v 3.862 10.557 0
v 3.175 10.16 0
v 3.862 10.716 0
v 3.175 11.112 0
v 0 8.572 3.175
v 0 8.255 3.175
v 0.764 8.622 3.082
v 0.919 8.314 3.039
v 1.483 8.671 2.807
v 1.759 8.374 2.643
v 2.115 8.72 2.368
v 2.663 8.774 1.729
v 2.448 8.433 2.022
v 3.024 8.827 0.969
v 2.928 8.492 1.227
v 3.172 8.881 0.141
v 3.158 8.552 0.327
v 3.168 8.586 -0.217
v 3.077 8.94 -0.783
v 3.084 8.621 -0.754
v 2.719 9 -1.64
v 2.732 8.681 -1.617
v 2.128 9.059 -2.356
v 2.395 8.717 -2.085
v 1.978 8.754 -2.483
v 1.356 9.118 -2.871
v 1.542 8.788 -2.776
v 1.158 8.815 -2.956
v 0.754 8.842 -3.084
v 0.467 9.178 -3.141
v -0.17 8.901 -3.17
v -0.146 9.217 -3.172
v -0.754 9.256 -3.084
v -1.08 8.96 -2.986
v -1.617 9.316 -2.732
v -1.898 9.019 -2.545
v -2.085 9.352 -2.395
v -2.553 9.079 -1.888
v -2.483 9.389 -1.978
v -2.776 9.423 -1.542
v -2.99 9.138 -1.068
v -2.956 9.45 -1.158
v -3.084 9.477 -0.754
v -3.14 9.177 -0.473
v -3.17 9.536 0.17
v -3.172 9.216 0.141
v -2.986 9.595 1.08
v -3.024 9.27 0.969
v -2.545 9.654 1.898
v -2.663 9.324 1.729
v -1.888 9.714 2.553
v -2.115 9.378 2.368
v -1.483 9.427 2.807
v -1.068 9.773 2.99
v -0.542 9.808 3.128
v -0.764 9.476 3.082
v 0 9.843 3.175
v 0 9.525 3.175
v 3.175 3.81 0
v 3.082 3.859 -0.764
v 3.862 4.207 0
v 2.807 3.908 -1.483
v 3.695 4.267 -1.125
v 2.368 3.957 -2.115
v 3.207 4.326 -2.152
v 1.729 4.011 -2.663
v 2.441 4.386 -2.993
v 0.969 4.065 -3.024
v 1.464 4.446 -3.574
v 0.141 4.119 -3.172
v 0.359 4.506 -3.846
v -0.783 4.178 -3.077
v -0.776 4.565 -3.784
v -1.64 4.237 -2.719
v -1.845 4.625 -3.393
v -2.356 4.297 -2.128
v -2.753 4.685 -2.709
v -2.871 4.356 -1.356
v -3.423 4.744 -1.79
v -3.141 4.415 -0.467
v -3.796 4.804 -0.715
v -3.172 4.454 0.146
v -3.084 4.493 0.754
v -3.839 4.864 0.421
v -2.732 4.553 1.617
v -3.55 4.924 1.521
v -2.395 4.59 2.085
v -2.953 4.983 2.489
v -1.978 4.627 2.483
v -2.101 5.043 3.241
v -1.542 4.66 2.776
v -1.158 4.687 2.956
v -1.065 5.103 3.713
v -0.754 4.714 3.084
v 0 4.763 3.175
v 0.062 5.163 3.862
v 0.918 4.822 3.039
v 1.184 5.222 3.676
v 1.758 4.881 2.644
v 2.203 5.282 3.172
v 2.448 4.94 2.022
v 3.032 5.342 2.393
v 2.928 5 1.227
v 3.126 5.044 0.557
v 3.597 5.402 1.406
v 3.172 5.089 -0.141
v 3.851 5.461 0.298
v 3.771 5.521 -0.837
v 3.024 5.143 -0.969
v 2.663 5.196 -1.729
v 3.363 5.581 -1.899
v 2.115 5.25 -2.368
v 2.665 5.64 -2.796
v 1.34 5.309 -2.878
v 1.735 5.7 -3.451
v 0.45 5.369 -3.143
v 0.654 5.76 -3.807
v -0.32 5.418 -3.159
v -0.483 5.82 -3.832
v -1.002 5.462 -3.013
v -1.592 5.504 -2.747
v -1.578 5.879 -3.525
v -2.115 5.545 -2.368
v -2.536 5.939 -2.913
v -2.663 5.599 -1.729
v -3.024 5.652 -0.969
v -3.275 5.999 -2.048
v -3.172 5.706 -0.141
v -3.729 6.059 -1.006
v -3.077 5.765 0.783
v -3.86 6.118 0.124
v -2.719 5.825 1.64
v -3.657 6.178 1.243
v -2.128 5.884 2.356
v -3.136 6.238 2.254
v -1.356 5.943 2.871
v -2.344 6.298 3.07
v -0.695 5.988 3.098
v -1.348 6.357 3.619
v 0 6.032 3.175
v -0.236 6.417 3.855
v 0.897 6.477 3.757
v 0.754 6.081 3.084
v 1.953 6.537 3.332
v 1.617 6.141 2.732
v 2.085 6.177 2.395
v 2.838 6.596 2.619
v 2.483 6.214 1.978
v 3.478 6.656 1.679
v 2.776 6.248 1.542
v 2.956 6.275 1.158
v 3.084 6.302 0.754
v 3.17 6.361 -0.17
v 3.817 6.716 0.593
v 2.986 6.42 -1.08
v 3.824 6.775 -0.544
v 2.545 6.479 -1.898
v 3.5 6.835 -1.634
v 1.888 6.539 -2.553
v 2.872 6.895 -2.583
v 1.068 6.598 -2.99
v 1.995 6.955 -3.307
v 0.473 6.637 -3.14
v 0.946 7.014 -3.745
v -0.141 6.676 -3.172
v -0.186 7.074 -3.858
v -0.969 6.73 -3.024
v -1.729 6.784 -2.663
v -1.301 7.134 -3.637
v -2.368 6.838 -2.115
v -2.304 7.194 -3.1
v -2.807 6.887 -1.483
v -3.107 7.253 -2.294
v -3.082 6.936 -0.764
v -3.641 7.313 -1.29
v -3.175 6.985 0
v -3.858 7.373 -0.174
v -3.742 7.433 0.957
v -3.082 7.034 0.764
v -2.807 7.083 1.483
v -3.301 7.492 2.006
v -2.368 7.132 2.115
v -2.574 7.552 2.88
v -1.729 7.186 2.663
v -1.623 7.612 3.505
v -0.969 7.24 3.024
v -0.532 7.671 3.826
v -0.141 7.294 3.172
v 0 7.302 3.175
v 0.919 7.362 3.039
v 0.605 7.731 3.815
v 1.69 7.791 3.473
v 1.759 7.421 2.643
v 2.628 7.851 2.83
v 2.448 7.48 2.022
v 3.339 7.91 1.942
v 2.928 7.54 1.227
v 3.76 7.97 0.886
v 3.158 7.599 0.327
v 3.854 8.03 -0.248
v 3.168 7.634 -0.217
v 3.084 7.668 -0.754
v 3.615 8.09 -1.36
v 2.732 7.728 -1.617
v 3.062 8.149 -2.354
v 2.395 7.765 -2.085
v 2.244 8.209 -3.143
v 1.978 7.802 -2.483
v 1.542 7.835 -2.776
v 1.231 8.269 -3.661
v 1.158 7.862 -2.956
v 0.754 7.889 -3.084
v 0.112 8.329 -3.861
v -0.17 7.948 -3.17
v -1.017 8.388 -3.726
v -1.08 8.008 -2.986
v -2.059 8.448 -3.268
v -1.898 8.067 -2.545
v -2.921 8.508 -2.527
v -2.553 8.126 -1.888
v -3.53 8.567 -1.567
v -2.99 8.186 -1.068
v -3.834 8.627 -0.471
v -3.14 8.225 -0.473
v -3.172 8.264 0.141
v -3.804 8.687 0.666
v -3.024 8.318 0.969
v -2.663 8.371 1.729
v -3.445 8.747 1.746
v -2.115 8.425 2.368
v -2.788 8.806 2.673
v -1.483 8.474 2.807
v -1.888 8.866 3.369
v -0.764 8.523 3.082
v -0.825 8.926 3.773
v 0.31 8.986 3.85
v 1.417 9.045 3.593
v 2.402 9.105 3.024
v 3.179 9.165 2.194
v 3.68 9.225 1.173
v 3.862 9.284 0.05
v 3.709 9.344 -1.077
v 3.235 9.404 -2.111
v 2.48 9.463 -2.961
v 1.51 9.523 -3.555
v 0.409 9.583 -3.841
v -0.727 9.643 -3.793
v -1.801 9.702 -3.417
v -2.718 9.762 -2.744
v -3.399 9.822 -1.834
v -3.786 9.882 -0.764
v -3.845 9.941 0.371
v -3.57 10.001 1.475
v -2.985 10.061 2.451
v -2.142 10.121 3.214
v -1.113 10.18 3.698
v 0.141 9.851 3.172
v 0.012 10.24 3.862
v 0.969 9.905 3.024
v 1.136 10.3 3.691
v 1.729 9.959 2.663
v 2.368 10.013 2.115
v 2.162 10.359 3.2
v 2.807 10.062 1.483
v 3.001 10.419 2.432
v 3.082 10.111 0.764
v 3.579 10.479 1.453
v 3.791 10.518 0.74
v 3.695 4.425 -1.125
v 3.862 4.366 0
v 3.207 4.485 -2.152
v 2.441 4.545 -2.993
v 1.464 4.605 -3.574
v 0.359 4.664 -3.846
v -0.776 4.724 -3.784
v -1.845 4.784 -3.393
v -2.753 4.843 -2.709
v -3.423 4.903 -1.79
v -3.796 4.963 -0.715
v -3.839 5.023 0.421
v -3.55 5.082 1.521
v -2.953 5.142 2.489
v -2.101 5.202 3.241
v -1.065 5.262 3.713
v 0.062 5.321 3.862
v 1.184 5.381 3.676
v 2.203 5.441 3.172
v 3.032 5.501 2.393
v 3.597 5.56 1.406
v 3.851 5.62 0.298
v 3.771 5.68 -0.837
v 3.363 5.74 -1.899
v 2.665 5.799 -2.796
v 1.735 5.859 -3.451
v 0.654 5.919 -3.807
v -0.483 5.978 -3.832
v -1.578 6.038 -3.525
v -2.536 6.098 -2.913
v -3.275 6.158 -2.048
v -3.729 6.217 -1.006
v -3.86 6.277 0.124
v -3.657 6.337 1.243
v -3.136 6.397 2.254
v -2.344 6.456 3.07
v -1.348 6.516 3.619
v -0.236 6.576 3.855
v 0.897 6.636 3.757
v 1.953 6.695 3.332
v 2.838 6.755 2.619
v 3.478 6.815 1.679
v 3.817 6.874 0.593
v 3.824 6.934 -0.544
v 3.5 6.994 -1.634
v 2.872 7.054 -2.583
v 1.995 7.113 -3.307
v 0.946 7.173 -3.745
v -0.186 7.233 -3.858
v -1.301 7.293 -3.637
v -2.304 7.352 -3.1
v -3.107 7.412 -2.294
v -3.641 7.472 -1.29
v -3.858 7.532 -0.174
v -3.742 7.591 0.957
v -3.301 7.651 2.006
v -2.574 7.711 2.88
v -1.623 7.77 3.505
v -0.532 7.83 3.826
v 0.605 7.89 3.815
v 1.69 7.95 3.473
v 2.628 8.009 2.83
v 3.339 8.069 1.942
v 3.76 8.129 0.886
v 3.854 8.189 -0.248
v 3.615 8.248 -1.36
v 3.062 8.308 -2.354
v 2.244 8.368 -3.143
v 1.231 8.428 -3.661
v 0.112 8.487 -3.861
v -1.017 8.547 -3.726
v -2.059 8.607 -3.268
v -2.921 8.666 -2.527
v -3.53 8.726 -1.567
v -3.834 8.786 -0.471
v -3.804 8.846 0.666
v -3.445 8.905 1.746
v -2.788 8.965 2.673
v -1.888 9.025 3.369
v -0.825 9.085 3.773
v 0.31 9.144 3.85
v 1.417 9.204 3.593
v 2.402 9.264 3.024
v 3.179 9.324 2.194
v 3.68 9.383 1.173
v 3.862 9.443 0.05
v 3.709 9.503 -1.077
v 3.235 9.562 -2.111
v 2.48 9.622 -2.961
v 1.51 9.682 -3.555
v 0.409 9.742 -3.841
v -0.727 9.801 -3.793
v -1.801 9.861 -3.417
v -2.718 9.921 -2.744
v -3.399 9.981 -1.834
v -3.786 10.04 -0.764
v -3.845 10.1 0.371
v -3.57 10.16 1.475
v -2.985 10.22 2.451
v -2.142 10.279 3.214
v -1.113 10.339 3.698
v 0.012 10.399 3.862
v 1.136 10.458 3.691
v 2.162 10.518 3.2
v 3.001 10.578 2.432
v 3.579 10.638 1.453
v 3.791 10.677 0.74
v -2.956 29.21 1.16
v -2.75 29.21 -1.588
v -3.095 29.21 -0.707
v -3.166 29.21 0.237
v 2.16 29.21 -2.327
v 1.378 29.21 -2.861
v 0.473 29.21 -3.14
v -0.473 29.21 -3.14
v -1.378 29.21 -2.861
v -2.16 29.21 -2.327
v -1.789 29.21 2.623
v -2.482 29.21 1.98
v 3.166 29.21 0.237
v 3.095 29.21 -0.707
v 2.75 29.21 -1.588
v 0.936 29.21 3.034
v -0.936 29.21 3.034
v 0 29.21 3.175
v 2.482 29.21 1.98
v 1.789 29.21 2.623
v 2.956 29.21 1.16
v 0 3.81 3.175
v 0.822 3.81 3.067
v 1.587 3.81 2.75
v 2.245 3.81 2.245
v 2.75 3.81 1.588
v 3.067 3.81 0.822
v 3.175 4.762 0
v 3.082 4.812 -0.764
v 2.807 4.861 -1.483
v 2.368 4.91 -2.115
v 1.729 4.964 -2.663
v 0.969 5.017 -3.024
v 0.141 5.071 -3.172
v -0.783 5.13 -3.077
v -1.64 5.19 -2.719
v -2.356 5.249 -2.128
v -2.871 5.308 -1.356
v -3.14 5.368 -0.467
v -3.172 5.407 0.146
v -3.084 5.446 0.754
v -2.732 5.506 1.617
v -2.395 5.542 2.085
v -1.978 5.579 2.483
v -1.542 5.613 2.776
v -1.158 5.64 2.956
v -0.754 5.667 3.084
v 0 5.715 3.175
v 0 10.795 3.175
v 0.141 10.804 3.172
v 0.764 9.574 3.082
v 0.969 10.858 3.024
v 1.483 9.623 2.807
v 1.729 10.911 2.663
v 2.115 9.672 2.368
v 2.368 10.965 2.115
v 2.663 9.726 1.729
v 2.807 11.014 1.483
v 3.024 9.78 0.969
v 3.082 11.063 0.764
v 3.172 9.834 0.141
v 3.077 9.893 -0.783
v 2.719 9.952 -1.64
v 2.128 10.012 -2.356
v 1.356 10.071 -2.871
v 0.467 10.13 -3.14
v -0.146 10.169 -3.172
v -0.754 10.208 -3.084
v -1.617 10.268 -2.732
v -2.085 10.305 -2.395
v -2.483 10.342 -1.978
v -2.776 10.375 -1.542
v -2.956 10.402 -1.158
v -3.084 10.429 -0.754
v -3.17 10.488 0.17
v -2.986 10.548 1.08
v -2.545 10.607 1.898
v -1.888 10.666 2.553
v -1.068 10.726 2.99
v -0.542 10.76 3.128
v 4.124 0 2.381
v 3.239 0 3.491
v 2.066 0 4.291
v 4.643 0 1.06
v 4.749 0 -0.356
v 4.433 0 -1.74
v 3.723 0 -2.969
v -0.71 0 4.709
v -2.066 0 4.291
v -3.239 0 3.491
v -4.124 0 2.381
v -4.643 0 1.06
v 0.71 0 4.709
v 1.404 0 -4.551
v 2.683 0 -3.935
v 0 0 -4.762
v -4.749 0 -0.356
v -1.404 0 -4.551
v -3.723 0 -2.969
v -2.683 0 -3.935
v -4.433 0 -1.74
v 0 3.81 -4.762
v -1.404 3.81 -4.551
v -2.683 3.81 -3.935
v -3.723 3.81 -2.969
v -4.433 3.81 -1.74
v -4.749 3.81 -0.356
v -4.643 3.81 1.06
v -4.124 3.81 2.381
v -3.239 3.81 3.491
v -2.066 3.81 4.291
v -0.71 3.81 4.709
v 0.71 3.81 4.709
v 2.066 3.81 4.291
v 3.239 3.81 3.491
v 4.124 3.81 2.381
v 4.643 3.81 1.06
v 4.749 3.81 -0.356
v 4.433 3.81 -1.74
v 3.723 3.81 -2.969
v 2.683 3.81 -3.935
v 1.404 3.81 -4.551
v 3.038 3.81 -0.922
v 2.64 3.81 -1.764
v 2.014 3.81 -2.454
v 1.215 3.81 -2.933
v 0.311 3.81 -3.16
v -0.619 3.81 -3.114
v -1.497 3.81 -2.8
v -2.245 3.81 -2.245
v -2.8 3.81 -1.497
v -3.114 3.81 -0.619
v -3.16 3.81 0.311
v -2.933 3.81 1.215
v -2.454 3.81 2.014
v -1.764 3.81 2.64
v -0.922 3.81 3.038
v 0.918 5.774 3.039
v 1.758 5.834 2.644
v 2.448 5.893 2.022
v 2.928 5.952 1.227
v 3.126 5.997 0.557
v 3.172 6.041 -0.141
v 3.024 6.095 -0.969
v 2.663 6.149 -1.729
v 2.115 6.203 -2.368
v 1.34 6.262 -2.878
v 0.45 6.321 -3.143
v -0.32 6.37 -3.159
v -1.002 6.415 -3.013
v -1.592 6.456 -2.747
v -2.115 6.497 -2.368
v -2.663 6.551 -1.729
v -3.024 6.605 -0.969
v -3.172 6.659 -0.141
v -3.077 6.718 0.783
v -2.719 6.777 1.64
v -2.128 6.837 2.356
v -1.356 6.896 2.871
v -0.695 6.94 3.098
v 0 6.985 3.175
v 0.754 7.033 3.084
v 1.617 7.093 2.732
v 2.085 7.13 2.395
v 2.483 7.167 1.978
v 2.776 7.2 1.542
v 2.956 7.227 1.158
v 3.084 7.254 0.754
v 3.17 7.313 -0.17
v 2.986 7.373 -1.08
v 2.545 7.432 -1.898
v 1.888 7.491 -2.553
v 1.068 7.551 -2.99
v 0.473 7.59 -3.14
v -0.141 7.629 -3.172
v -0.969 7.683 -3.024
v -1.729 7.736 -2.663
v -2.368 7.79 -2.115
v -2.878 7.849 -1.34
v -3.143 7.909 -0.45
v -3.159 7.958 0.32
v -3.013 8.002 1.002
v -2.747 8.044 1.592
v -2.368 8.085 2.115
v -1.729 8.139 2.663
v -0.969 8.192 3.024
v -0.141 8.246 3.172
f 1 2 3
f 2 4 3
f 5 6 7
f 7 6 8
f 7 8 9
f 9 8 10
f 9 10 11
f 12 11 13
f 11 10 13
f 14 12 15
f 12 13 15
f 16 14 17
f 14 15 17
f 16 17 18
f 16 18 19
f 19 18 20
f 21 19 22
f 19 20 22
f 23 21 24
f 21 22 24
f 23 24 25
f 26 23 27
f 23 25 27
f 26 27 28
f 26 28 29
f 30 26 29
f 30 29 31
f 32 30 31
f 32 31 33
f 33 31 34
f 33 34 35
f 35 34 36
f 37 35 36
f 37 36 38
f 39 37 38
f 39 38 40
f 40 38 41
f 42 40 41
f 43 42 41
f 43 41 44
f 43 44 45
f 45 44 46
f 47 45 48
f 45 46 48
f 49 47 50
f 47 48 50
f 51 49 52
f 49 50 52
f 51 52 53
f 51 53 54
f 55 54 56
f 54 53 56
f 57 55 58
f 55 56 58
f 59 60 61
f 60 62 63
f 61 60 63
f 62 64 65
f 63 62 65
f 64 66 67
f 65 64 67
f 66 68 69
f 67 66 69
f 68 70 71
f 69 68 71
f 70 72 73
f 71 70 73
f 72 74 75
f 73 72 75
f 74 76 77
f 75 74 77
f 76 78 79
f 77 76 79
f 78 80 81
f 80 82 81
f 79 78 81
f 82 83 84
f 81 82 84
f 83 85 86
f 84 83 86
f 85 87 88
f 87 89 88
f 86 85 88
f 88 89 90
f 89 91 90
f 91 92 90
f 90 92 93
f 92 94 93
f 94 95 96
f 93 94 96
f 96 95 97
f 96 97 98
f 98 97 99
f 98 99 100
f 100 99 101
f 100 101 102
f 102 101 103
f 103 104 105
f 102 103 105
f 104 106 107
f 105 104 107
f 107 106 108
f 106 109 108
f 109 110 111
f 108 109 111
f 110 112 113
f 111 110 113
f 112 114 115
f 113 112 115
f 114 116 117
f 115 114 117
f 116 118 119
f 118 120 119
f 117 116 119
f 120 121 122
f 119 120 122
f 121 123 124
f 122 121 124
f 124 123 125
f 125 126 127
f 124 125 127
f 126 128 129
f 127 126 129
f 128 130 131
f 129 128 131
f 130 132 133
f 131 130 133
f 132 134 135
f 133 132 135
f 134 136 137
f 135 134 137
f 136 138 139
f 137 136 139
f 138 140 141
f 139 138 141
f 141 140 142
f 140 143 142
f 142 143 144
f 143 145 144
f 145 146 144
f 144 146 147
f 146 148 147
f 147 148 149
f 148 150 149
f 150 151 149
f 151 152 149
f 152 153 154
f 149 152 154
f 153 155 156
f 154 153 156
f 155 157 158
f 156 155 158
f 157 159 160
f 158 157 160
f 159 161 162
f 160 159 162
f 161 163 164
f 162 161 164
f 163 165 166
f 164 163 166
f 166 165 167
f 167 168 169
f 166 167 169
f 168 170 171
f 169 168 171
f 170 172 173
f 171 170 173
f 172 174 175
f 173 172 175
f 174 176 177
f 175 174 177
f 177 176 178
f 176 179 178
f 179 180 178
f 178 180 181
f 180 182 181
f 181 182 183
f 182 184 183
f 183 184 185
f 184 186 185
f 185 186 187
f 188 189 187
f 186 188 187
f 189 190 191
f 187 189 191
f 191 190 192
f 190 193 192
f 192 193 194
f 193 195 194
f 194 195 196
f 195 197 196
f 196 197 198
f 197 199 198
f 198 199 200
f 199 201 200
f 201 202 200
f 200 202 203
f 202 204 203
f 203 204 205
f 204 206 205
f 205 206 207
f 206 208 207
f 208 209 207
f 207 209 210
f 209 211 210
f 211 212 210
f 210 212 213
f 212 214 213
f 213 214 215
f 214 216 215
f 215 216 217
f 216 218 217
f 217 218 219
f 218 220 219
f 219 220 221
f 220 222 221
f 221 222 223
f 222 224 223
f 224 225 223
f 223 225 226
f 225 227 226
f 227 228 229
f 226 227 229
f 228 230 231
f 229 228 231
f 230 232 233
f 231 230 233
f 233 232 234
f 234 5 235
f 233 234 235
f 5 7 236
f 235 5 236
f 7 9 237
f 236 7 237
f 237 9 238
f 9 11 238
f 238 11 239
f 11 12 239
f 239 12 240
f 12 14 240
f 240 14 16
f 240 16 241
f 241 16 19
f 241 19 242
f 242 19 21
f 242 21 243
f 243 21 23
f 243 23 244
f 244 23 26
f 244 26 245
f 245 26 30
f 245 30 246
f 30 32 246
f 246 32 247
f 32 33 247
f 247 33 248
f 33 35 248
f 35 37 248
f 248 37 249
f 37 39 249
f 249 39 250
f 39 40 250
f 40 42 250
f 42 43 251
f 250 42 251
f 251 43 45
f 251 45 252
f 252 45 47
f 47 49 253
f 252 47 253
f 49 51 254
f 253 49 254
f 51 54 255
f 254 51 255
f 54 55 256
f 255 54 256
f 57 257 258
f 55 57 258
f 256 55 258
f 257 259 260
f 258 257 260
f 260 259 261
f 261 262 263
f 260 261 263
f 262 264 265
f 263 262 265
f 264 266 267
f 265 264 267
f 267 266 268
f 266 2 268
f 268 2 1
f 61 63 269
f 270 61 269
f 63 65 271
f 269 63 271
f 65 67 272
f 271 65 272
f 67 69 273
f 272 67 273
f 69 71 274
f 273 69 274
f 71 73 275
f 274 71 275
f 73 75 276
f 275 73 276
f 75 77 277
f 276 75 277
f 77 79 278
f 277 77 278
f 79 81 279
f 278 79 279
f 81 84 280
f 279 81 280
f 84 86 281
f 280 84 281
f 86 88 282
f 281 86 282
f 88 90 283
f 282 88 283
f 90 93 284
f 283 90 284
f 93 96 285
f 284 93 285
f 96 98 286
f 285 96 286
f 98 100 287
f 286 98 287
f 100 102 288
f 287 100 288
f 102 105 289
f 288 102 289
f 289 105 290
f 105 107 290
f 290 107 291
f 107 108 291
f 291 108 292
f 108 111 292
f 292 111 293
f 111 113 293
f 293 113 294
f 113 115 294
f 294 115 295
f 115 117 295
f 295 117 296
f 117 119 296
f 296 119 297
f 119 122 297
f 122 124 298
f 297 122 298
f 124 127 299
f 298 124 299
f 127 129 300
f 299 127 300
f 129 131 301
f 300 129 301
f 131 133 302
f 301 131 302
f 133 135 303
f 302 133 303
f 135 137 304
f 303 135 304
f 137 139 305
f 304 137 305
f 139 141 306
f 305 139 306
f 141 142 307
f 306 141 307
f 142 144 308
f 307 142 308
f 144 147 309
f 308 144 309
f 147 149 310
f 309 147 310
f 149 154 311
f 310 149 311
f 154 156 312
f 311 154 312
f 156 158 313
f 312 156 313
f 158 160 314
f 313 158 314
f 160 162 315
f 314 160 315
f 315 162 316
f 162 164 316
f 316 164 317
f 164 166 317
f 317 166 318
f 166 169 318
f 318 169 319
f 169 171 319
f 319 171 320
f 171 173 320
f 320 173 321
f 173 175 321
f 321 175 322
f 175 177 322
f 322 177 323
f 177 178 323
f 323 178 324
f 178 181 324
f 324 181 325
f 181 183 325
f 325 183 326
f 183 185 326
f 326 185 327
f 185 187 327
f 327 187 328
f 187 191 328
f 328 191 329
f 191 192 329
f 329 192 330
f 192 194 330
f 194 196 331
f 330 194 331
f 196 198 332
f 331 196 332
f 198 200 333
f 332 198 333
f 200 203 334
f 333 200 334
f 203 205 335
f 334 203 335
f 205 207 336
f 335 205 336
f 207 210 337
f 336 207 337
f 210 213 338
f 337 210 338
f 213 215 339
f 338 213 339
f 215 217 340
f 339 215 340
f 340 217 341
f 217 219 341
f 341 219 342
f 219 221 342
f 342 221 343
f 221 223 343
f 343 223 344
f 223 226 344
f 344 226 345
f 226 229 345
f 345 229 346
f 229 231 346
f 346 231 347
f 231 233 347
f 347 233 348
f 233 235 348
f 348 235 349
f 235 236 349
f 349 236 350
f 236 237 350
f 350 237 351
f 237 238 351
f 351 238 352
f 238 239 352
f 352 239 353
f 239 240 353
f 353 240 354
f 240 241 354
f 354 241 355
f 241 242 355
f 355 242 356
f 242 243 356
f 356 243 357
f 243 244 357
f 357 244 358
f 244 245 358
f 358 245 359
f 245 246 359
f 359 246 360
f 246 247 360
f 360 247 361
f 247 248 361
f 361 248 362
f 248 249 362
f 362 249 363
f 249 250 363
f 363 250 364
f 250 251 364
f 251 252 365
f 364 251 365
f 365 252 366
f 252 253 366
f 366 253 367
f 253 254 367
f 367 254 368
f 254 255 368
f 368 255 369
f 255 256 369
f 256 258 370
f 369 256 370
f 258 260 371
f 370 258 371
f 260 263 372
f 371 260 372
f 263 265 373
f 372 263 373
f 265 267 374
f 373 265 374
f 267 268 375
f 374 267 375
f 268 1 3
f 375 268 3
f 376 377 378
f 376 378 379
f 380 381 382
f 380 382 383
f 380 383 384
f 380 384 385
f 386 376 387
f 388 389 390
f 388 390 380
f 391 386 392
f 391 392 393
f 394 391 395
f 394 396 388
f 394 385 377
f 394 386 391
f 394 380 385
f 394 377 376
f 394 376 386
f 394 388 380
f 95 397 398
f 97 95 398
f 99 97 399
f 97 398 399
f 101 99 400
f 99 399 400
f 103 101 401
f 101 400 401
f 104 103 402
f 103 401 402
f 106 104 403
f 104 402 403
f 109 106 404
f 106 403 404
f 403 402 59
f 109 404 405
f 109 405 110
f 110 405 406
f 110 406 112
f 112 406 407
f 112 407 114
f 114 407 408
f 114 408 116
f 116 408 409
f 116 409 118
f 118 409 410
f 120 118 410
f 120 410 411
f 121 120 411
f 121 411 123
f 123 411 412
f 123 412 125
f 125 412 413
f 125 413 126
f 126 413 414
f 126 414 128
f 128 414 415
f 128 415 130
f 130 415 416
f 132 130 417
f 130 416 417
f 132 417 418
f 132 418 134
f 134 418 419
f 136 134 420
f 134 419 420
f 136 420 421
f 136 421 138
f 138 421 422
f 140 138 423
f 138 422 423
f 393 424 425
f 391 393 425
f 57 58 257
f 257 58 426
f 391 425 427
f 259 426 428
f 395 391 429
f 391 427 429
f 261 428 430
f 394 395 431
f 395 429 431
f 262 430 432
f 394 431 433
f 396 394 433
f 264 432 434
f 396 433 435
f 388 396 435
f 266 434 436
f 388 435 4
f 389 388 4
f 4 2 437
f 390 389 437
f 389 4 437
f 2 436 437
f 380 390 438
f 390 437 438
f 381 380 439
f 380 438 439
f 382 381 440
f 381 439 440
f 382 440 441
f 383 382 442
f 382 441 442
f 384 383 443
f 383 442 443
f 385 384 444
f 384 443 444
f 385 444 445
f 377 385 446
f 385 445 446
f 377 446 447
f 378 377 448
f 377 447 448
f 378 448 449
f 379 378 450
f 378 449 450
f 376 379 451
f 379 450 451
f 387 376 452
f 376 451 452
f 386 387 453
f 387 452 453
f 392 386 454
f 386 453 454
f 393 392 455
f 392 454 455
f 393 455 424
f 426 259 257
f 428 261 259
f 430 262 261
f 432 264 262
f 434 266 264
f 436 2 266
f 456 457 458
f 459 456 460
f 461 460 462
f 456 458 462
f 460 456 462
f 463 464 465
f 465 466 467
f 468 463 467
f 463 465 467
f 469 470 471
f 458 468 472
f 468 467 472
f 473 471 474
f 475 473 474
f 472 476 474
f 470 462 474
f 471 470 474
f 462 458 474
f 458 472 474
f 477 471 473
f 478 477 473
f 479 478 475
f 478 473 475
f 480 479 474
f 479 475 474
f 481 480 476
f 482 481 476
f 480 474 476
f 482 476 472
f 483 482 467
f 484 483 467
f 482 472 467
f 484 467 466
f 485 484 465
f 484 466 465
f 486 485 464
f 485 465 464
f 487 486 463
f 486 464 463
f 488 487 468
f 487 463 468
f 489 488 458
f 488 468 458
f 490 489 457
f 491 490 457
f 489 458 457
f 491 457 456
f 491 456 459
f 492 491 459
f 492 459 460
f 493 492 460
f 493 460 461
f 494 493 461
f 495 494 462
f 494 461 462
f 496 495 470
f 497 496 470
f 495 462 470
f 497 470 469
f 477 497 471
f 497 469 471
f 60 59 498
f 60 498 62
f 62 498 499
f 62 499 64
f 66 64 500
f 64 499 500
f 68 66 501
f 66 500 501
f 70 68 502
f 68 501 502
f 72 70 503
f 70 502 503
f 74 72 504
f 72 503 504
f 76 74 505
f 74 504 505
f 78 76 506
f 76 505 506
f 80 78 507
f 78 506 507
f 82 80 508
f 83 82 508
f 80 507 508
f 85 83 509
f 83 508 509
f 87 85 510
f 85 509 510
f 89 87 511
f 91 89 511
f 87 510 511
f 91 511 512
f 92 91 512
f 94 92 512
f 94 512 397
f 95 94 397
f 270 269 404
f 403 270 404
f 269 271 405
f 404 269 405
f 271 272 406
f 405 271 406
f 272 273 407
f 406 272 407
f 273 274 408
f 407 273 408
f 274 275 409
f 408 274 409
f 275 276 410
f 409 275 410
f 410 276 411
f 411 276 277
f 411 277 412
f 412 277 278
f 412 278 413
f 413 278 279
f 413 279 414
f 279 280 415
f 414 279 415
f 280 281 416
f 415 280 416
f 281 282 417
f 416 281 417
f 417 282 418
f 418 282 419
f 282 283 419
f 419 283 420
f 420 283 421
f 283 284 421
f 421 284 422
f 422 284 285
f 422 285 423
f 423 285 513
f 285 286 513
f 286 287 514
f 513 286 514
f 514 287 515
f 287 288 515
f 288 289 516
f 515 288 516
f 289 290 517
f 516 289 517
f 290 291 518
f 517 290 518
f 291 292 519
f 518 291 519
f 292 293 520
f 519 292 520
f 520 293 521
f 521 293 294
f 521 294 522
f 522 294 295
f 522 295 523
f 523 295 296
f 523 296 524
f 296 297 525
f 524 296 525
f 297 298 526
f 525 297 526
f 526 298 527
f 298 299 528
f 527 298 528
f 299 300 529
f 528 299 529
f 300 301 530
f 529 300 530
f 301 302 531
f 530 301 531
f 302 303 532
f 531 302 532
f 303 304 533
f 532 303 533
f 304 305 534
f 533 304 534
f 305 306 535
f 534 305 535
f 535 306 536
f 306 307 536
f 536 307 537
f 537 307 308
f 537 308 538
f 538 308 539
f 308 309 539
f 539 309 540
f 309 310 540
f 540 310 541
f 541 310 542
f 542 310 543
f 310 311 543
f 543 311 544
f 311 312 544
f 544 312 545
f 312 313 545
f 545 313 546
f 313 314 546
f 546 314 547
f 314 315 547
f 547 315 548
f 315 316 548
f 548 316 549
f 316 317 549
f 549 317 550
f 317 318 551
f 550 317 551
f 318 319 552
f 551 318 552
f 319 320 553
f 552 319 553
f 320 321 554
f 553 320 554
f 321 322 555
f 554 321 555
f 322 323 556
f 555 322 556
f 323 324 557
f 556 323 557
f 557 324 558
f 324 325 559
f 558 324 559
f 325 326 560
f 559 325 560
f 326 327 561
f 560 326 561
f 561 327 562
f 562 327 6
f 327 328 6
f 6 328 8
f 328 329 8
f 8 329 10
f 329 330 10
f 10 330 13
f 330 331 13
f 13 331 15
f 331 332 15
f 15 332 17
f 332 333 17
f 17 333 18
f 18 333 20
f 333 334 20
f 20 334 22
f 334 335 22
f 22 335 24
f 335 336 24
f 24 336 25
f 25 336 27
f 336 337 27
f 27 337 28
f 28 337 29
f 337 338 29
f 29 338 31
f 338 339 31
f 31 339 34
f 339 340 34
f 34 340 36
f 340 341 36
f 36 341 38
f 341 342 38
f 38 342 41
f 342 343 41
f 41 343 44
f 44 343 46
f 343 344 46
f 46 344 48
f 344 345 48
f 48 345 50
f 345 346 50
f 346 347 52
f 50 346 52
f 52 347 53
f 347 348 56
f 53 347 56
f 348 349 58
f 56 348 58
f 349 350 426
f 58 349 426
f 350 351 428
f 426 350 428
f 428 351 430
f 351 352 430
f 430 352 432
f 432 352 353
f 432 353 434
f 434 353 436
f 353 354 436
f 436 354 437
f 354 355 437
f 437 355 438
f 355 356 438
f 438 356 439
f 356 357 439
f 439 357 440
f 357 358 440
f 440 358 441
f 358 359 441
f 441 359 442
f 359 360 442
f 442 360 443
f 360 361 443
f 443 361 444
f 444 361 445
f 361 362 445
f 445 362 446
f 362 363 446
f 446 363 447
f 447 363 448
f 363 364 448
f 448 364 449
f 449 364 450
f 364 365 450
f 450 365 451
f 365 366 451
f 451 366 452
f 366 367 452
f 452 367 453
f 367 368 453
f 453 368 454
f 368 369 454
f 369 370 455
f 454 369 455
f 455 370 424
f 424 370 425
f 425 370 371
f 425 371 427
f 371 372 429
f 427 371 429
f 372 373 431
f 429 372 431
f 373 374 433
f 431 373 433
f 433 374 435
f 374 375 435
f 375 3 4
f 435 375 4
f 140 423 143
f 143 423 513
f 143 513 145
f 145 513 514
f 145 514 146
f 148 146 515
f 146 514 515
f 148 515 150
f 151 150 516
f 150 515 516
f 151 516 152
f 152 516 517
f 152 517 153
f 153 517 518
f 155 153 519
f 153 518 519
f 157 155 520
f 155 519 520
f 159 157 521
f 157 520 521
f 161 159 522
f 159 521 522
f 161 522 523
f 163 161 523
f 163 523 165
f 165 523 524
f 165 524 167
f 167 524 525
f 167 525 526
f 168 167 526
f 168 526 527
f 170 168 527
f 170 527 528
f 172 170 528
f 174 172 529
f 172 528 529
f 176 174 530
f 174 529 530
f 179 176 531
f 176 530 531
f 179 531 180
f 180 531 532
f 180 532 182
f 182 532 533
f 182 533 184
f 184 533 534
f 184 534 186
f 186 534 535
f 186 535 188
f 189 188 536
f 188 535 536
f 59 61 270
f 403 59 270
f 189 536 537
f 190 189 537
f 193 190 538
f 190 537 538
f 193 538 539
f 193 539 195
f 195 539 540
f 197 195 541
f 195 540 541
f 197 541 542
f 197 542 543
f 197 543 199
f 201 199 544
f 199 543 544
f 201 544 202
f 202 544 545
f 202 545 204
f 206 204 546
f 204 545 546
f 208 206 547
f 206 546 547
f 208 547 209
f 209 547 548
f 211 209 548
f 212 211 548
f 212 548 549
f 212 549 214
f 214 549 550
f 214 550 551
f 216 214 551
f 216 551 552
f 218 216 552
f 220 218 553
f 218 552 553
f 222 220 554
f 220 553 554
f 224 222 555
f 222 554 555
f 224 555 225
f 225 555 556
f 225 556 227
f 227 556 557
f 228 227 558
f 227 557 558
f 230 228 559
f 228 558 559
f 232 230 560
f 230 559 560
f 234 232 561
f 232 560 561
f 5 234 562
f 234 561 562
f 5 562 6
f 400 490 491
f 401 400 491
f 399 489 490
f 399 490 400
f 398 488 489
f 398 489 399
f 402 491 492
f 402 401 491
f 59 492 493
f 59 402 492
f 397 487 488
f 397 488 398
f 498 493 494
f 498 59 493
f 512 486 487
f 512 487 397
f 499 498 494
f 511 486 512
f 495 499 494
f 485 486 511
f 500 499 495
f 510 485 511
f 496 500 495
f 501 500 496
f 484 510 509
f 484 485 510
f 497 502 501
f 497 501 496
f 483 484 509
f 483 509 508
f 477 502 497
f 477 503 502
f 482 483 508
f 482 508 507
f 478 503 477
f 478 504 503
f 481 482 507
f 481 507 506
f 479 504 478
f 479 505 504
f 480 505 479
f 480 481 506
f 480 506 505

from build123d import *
from build123d.topology import SkipClean

# Parameters (mm, degrees)
SKETCH2_R           = 4.7625
BOSS_EXTRUDE1_DEPTH = 3.81
SKETCH3_R           = 3.175
BOSS_EXTRUDE2_DEPTH = 25.4
THREAD2_PITCH       = 1.27
THREAD2_HEIGHT      = 6.35
THREAD2_RADIUS      = 3.175
THREAD2_START_ANGLE = 90


with BuildPart() as part:
    # Sketch2 → Boss-Extrude1 (new body)
    with BuildSketch(Plane(origin=(0, 0, 0), x_dir=(1, 0, 0), z_dir=(0, 1, 0))):
        with Locations(Location((0, 0, 0), (0, 0, 90))):
            Circle(SKETCH2_R)
    extrude(amount=BOSS_EXTRUDE1_DEPTH)

    # Sketch3 → Boss-Extrude2 (add)
    with BuildSketch(Plane(origin=(0, 3.81, 0), x_dir=(1, 0, 0), z_dir=(0, 1, 0))):
        with Locations(Location((0, 0, 0), (0, 0, 270))):
            Circle(SKETCH3_R)
    extrude(amount=BOSS_EXTRUDE2_DEPTH)

    # Thread2: sweep along a helix
    with SkipClean():  # the faces are left unmerged after this step: merging them gives an invalid solid
        with BuildLine() as thread2_path:
            add(Helix(THREAD2_PITCH, THREAD2_HEIGHT, THREAD2_RADIUS, center=(0, 3.81, 0), direction=(0, 1, 0), mode=Mode.PRIVATE).rotate(Axis((0, 3.81, 0), (0, 1, 0)), THREAD2_START_ANGLE))
        # Thread Profile2 → Thread2 (sweep)
        with BuildSketch(Plane(origin=(3.175, 3.81, 0), x_dir=(1, 0, 0), z_dir=(0, 0, 1))):
            Polygon((0, 0), (0.687407661, 0.396874998), (0.687407661, 0.555624998), (0, 0.952499997), align=None)
        sweep(path=thread2_path.line, is_frenet=True)


solid = part.part
